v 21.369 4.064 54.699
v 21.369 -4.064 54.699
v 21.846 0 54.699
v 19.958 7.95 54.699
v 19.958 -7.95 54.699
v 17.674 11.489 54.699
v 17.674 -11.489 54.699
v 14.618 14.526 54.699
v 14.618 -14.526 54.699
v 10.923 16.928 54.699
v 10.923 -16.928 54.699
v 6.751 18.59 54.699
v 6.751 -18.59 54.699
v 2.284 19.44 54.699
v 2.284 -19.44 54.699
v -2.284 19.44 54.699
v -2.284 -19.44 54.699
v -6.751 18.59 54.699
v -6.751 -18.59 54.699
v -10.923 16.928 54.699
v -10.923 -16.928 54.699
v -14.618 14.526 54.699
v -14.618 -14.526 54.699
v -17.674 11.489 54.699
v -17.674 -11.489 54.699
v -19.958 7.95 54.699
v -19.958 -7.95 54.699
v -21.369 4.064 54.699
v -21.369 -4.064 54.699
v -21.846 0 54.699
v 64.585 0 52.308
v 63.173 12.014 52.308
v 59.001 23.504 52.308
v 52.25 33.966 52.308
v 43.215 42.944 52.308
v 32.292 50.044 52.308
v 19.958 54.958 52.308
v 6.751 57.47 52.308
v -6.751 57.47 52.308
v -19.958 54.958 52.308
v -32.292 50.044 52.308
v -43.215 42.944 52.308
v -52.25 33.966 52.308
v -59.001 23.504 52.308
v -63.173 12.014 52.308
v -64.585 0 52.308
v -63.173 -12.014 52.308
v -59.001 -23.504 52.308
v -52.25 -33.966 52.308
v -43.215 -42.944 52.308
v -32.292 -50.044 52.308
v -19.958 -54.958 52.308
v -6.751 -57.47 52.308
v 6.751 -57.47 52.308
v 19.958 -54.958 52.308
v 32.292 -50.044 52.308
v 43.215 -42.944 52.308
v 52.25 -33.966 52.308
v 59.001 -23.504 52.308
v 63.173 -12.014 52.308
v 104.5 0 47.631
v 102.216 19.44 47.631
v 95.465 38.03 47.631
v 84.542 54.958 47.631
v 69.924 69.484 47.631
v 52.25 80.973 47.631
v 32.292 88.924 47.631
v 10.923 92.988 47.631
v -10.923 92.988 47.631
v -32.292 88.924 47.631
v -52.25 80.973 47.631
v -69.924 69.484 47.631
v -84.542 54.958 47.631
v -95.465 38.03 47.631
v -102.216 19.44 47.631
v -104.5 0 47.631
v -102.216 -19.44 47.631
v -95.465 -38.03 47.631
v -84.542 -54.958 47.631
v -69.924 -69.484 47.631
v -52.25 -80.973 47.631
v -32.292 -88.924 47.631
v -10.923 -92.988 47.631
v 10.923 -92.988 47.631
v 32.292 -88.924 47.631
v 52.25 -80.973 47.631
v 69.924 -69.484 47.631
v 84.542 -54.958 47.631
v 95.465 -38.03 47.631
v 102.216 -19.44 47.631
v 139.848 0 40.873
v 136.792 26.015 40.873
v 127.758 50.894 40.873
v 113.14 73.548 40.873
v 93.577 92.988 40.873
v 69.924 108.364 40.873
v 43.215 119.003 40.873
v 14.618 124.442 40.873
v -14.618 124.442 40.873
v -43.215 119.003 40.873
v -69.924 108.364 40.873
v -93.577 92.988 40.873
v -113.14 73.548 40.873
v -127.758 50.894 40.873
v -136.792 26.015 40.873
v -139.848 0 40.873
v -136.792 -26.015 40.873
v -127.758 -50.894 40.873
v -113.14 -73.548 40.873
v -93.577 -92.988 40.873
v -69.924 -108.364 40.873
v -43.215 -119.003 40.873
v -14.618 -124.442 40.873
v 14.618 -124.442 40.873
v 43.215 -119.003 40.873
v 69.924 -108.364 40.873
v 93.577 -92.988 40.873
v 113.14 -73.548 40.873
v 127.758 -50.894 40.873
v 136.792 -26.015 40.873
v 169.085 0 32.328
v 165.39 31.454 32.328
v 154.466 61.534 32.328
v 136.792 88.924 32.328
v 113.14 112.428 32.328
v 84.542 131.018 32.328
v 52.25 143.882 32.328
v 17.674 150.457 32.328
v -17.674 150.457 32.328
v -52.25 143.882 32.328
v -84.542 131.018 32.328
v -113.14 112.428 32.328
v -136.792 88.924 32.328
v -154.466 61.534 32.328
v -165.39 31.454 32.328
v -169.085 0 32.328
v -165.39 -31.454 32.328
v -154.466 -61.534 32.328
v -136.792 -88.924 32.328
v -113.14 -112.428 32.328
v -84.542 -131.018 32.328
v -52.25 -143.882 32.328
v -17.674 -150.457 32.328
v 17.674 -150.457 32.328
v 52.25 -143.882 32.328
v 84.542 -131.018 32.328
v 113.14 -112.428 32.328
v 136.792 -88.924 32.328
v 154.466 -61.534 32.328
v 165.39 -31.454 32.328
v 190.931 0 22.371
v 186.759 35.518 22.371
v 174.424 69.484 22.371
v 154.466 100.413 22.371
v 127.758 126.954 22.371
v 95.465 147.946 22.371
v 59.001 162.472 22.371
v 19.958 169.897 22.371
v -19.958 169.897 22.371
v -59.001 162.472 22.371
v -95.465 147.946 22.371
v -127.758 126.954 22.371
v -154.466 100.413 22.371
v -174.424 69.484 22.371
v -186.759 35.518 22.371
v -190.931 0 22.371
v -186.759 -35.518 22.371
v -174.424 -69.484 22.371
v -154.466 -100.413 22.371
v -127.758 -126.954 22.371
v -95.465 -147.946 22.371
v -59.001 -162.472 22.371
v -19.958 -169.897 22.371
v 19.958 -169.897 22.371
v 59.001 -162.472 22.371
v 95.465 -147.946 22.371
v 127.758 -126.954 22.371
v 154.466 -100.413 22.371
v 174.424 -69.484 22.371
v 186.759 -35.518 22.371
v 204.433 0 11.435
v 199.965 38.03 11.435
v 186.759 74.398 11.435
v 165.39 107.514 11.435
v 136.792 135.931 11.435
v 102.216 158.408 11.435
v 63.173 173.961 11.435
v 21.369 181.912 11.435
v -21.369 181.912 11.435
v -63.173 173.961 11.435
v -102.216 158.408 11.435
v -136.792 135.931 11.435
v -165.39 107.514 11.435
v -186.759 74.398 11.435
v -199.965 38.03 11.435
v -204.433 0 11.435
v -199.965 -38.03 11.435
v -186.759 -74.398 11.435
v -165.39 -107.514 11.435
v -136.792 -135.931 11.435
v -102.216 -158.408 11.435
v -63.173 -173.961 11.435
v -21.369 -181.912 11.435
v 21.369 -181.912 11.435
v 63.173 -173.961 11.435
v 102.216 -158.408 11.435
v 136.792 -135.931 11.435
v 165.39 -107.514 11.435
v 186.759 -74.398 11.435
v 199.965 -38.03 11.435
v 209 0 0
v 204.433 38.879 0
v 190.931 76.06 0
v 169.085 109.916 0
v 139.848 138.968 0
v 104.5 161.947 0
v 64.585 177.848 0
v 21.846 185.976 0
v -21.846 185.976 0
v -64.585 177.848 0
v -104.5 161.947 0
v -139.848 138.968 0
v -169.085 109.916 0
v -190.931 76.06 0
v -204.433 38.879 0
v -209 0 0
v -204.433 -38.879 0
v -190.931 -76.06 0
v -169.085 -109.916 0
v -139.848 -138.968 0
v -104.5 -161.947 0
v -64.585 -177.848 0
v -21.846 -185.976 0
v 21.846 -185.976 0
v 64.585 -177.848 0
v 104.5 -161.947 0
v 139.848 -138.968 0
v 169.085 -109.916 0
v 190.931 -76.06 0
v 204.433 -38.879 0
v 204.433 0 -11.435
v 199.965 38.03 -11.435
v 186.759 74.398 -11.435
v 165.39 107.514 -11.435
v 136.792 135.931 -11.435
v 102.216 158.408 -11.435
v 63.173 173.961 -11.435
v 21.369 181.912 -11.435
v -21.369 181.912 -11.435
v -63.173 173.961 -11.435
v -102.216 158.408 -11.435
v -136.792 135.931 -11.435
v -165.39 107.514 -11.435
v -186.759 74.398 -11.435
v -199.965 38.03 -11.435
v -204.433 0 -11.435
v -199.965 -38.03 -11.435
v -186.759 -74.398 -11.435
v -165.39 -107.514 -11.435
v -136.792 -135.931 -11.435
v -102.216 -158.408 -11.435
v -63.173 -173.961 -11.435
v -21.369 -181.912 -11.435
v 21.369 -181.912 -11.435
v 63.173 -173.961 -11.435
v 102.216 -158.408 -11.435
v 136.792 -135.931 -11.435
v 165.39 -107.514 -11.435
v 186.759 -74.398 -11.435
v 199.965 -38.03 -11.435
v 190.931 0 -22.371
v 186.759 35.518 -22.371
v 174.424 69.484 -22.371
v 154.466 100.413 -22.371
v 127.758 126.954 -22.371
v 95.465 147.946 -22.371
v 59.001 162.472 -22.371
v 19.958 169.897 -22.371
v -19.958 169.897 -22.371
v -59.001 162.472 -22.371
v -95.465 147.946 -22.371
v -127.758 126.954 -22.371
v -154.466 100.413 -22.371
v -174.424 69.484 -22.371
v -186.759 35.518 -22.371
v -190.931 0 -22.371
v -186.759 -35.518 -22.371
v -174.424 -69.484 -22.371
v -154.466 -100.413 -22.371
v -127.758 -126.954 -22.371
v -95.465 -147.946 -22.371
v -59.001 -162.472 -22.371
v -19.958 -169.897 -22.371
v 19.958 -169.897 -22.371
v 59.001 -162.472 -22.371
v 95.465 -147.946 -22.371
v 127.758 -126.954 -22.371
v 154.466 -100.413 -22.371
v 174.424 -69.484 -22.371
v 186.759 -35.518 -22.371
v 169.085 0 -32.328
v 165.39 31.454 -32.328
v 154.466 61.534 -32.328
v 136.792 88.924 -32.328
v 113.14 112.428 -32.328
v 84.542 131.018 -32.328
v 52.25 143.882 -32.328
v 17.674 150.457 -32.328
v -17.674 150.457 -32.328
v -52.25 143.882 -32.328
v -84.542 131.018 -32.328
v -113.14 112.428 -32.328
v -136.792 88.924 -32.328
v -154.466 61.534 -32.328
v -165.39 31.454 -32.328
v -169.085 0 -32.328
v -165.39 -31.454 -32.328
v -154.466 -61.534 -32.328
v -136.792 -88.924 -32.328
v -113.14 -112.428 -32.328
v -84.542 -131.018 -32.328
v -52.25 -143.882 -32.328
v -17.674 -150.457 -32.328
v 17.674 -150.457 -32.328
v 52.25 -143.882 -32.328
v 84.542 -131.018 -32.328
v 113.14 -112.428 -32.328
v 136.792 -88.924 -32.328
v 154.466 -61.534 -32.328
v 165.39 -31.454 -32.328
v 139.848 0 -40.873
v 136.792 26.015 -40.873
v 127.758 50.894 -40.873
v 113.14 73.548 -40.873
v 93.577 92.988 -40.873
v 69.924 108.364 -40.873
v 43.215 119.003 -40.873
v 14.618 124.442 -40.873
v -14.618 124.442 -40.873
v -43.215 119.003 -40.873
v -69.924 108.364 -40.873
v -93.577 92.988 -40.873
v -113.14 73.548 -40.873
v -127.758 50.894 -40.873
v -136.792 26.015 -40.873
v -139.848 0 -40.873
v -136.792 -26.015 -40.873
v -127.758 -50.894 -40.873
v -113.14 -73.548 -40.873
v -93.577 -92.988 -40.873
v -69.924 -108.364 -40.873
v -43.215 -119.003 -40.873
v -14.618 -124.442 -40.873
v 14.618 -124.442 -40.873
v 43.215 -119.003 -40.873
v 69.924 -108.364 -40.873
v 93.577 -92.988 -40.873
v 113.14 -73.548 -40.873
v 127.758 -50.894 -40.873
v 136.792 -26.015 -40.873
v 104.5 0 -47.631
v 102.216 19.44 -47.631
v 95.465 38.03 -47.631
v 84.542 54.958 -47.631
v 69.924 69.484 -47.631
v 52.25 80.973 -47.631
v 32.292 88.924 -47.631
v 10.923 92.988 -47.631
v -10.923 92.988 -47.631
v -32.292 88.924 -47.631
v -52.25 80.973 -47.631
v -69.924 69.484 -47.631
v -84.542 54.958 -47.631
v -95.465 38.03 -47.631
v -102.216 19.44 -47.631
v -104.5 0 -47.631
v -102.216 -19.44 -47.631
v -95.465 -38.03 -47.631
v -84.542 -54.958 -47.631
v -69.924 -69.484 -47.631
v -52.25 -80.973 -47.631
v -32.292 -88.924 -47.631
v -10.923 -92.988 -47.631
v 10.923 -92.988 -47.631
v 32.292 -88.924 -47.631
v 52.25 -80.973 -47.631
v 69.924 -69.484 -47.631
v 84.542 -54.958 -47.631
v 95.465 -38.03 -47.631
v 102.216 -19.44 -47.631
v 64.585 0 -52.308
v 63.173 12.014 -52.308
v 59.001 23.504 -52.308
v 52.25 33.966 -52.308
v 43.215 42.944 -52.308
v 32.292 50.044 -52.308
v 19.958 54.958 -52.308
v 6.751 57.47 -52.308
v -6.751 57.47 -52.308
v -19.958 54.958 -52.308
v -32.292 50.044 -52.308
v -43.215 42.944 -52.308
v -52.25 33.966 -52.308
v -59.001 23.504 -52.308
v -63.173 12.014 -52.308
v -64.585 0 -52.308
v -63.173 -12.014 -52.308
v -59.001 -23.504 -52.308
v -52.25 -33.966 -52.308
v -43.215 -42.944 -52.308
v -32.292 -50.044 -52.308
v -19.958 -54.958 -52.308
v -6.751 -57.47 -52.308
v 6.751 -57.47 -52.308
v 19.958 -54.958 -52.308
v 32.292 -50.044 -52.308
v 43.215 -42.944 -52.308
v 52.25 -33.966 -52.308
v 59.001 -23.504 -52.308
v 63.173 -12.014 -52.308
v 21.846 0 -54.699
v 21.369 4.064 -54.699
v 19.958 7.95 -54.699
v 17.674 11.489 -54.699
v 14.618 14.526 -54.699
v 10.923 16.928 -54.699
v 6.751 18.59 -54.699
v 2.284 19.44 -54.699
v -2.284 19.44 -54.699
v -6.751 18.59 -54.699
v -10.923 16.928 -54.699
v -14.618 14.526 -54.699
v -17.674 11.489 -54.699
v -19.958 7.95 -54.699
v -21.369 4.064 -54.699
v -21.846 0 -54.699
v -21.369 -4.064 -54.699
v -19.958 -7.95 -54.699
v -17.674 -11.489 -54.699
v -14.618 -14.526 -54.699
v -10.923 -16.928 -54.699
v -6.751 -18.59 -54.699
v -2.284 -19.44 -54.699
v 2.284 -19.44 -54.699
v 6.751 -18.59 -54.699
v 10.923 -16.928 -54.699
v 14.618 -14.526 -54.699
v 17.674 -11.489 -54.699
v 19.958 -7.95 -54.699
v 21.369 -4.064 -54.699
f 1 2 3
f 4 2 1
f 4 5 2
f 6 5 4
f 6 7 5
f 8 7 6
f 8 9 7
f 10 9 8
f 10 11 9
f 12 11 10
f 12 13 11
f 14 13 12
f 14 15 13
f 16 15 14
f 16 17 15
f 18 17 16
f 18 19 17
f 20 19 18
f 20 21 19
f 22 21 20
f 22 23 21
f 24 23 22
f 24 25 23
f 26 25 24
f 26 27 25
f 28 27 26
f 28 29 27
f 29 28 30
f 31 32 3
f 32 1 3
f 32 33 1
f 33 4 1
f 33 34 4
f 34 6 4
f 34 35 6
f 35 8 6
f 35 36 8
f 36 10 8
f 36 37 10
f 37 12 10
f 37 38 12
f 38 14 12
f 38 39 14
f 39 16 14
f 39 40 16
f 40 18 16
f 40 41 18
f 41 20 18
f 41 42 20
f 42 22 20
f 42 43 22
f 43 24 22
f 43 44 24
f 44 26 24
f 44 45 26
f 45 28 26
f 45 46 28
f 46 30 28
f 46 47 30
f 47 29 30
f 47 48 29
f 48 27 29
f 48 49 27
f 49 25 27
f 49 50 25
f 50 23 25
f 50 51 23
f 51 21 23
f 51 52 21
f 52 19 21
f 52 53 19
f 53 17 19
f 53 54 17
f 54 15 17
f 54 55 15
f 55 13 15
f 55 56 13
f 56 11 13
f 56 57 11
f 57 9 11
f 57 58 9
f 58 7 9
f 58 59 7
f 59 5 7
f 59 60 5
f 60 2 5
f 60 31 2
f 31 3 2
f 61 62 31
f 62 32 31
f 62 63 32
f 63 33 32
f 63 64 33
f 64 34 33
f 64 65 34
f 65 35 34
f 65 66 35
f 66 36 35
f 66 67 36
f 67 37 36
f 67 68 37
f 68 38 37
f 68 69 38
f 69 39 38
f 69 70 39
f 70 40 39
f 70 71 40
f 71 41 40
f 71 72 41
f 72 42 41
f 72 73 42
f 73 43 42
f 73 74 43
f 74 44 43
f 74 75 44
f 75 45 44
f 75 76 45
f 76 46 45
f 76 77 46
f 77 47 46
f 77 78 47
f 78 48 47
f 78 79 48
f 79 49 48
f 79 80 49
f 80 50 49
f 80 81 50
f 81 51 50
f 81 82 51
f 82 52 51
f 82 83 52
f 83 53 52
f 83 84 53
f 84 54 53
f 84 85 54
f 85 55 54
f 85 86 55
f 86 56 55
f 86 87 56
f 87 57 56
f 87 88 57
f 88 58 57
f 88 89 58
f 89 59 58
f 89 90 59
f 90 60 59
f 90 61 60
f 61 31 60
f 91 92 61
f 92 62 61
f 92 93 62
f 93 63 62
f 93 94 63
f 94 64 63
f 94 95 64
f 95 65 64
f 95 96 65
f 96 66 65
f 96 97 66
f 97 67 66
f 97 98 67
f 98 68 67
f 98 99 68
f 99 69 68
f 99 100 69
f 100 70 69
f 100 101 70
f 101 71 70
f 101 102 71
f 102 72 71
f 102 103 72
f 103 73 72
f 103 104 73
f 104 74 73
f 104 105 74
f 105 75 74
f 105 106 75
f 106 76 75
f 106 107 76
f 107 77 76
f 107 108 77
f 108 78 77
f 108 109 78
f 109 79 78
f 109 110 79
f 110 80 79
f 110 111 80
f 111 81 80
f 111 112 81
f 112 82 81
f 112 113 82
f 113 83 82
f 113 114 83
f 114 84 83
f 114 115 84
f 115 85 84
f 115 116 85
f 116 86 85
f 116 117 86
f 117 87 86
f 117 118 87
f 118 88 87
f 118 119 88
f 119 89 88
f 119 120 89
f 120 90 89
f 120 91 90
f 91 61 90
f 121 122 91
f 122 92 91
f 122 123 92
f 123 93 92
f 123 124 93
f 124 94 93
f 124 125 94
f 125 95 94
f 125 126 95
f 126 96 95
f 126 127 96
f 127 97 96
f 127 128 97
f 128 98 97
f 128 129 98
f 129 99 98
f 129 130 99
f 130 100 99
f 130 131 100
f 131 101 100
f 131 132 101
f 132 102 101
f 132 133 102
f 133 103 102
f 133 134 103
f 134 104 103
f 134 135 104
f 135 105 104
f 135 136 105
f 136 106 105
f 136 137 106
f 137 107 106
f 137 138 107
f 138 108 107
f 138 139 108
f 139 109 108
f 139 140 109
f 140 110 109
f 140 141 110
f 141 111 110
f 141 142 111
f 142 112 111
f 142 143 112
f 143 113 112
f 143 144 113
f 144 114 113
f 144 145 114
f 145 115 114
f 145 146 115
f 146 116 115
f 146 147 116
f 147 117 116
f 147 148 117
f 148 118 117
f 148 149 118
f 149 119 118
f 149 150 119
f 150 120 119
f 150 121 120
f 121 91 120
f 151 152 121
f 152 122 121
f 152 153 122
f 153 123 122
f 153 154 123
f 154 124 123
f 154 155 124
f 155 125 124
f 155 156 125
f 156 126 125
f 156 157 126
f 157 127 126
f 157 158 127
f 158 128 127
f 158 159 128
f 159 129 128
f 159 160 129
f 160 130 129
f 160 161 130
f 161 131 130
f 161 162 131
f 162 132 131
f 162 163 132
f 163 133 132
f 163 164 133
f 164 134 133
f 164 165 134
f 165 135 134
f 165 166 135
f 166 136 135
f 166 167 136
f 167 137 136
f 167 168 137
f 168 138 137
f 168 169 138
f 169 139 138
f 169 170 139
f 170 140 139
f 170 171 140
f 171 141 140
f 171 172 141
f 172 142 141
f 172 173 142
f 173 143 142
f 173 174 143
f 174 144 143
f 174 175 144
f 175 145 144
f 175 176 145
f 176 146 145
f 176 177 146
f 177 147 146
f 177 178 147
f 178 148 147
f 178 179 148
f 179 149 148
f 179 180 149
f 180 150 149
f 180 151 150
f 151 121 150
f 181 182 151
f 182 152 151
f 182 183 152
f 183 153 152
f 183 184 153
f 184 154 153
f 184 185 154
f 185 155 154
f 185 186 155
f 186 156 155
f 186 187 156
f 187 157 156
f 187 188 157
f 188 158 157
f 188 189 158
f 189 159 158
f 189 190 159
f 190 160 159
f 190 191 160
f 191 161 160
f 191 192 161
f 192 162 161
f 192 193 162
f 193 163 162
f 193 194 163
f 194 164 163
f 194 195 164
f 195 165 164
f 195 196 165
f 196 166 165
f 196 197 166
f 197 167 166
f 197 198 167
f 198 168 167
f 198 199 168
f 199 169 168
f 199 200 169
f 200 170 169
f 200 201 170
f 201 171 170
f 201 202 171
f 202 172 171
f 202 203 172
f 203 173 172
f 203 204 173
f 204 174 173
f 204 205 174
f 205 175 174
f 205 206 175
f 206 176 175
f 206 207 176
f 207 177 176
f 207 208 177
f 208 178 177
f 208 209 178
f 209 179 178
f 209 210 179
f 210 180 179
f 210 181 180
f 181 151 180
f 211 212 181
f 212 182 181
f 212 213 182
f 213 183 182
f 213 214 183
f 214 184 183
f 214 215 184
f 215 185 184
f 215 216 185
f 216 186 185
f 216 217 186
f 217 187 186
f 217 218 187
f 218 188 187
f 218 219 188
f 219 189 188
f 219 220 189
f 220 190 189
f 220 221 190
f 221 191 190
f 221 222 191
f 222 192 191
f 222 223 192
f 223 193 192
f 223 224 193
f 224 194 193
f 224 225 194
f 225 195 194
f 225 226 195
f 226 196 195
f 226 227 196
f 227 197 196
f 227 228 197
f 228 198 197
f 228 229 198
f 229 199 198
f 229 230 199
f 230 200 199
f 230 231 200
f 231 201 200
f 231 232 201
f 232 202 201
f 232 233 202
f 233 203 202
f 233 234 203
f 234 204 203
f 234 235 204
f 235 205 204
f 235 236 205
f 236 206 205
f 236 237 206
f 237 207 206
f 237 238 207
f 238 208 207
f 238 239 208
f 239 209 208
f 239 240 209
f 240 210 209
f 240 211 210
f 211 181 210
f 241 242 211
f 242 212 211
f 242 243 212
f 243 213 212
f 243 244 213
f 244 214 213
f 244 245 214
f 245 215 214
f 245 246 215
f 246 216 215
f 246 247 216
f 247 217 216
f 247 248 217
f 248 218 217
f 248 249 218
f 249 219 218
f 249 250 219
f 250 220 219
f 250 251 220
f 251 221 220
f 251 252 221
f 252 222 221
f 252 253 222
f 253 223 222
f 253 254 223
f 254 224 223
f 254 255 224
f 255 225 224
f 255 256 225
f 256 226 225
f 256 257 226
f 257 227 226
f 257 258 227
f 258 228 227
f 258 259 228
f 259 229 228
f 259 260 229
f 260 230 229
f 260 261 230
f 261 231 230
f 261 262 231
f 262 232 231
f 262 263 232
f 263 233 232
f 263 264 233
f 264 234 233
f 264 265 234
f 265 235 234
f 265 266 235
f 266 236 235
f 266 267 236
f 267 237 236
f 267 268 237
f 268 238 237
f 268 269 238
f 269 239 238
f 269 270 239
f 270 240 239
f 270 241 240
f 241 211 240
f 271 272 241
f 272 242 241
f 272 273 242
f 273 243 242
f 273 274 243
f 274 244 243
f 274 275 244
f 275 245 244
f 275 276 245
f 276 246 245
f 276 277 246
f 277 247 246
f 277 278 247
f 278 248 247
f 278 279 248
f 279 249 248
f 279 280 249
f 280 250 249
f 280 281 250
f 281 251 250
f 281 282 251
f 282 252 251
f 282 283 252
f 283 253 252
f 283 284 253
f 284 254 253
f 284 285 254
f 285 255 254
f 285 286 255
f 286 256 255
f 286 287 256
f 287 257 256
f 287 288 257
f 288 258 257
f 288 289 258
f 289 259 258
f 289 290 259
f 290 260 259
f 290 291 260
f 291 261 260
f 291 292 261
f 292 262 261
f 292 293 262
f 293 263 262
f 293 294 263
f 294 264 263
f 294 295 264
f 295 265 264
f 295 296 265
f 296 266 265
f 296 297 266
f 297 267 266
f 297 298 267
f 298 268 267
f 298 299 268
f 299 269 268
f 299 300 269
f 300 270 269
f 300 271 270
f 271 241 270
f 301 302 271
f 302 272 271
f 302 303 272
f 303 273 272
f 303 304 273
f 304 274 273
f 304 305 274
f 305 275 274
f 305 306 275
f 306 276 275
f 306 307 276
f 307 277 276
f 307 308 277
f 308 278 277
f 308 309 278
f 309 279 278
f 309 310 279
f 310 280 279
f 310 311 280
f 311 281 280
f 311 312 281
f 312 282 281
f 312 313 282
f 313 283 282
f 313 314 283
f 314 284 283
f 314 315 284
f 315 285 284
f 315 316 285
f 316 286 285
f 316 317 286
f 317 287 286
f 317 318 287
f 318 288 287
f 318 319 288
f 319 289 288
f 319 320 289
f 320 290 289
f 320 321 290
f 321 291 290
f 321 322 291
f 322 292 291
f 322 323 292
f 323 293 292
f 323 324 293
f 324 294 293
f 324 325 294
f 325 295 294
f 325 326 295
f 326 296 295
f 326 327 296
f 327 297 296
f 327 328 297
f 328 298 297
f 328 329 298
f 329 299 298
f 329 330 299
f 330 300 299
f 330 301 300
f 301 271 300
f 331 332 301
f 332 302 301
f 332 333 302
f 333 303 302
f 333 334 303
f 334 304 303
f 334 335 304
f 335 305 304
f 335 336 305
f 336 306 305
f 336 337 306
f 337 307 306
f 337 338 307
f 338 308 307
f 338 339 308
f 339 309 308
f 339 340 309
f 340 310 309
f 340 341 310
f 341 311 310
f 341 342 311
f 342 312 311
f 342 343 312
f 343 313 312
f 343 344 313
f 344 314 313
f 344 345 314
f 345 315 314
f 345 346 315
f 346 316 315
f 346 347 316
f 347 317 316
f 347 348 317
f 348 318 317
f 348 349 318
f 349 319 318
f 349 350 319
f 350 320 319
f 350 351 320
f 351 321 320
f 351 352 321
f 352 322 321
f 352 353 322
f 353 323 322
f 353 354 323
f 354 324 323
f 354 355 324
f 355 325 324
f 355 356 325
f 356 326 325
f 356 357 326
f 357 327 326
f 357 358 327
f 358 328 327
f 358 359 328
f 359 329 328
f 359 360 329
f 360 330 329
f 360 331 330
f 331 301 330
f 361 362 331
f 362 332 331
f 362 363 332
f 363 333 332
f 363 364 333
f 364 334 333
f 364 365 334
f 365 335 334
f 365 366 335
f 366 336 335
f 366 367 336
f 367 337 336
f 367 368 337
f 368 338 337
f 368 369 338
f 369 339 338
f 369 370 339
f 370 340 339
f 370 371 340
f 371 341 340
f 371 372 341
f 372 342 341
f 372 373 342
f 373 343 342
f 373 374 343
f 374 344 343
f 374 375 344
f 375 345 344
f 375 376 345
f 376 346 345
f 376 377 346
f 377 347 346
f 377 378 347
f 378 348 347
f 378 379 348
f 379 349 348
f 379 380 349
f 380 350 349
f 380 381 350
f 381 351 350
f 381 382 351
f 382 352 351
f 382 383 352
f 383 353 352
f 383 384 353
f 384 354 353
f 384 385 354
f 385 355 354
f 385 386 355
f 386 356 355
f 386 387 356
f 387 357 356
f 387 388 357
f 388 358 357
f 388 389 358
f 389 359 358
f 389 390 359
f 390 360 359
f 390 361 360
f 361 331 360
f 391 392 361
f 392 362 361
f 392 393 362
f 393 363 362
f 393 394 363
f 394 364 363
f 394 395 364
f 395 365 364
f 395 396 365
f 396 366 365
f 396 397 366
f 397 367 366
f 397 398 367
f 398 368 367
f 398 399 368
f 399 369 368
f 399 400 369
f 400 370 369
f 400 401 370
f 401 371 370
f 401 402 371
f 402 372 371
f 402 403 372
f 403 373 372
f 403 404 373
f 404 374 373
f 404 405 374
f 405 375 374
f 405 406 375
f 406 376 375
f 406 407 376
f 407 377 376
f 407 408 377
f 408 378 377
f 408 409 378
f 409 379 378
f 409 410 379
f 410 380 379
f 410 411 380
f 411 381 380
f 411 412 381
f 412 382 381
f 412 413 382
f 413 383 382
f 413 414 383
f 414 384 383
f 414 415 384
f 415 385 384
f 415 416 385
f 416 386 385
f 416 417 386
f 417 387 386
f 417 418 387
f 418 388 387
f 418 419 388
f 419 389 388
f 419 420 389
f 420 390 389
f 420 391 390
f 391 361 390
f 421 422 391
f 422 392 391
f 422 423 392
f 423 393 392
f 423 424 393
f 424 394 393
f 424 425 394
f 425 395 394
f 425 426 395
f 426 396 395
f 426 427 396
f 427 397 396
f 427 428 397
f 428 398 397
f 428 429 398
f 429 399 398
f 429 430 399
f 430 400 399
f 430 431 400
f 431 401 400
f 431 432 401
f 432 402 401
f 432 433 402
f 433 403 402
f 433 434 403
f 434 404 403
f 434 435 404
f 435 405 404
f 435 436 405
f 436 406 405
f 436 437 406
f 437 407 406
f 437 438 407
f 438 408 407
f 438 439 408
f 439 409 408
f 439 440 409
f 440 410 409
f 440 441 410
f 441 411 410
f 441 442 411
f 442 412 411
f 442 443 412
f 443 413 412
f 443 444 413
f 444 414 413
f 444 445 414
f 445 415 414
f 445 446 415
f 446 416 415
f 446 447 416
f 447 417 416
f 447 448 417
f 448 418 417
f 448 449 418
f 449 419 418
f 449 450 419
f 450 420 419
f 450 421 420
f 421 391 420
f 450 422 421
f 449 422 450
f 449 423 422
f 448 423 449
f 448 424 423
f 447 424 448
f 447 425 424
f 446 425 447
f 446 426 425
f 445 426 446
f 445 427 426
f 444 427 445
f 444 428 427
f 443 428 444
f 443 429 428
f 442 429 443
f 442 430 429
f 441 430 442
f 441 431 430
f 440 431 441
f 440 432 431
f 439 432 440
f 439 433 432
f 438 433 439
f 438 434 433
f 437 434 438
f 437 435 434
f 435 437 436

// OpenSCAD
// Generated by SolidPython 1.0.1 on 2020-07-29 00:46:54


scale(v = [19, 17, 5]) {
	sphere(r = 11);
}
/***********************************************
*********      SolidPython code:      **********
************************************************
 
# import packages: SolidPython
from solid import *
from solid.utils import *
from itertools import chain, combinations, permutations


class Resize:

    def __init__(self, scad_file):
        self.scad_file = scad_file
        #self.scad_file = import_scad(scad_file)
        # cone/cylinder param:
        self.r1 = 0
        self.r2 = 0
        self.h = 0
        # rectangular prism param:
        self.w = 0
        self.l = 0
        # ellipse param:
        self.r = 0

    # import OpenScad code (file name corresponds to shape)


    # classify shape + parameters
    def assign(self, param1, param2, param3):
        if self.scad_file == 'cone.scad':
            self.r1 = param1
            self.r2 = param2
            self.h = param3
        elif self.scad_file == 'cylinder.scad':
            self.r1 = param1
            self.r2 = param2
            self.h = param3
        elif self.scad_file == 'rectangularPrism.scad':
            self.h = param1
            self.l = param2
            self.w = param3
        else:
            self.r = param1
            self.h = param2

    # resize parameters
    def iterate(self):
        x = range(3, 20, 2)
        i = 1
        if self.scad_file == 'cone.scad':
            tempList = list(permutations(x, 2))
            for temp in tempList:
                param1 = temp[0]
                param2 = temp[1]
                filepath = 'produced_scad_files/' + 'cone' + str(param1) + '_' + str(param2) + '_' + '.scad'
                scad_render_to_file(cylinder(h=param1, r1=param2, r2=0), filepath)

        elif self.scad_file == 'cylinder.scad':
            tempList = list(permutations(x, 3))
            for temp in tempList:
                param1 = temp[0]
                param2 = temp[1]
                filepath = 'produced_scad_files/' + 'cylinder' + str(param1) + '_' + str(param2) + '_' + '.scad'
                scad_render_to_file(cylinder(h=param1, r1=param2, r2=param2), filepath)

        elif self.scad_file == 'rectangularPrism.scad':
            tempList = list(permutations(x, 3))
            for temp in tempList:
                param1 = temp[0]
                param2 = temp[1]
                param3 = temp[2]
                filepath = 'produced_scad_files/' + 'rectangularPrism' + str(param1) + '_' + str(param2) + '_' + str(
                    param3) + '.scad'
                scad_render_to_file(cube(size=(param1, param2, param3)), filepath)

        elif self.scad_file == 'ellipse.scad':
            tempList = list(permutations(x, 4))
            for temp in tempList:
                param1 = temp[0]
                param2 = temp[1]
                param3 = temp[2]
                param4 = temp[3]
                filepath = 'produced_scad_files/' + 'ellipse' + str(param1) + '_' + str(param2) + '_' + str(param3) + '_' + str(param4) + '.scad'
                scad_render_to_file(scale([param1, param2, param3])(sphere(r=param4)), filepath)

    def render_to_scadfile(self):
        scad_render_to_file(scad, 'example.scad') 
 
************************************************/
